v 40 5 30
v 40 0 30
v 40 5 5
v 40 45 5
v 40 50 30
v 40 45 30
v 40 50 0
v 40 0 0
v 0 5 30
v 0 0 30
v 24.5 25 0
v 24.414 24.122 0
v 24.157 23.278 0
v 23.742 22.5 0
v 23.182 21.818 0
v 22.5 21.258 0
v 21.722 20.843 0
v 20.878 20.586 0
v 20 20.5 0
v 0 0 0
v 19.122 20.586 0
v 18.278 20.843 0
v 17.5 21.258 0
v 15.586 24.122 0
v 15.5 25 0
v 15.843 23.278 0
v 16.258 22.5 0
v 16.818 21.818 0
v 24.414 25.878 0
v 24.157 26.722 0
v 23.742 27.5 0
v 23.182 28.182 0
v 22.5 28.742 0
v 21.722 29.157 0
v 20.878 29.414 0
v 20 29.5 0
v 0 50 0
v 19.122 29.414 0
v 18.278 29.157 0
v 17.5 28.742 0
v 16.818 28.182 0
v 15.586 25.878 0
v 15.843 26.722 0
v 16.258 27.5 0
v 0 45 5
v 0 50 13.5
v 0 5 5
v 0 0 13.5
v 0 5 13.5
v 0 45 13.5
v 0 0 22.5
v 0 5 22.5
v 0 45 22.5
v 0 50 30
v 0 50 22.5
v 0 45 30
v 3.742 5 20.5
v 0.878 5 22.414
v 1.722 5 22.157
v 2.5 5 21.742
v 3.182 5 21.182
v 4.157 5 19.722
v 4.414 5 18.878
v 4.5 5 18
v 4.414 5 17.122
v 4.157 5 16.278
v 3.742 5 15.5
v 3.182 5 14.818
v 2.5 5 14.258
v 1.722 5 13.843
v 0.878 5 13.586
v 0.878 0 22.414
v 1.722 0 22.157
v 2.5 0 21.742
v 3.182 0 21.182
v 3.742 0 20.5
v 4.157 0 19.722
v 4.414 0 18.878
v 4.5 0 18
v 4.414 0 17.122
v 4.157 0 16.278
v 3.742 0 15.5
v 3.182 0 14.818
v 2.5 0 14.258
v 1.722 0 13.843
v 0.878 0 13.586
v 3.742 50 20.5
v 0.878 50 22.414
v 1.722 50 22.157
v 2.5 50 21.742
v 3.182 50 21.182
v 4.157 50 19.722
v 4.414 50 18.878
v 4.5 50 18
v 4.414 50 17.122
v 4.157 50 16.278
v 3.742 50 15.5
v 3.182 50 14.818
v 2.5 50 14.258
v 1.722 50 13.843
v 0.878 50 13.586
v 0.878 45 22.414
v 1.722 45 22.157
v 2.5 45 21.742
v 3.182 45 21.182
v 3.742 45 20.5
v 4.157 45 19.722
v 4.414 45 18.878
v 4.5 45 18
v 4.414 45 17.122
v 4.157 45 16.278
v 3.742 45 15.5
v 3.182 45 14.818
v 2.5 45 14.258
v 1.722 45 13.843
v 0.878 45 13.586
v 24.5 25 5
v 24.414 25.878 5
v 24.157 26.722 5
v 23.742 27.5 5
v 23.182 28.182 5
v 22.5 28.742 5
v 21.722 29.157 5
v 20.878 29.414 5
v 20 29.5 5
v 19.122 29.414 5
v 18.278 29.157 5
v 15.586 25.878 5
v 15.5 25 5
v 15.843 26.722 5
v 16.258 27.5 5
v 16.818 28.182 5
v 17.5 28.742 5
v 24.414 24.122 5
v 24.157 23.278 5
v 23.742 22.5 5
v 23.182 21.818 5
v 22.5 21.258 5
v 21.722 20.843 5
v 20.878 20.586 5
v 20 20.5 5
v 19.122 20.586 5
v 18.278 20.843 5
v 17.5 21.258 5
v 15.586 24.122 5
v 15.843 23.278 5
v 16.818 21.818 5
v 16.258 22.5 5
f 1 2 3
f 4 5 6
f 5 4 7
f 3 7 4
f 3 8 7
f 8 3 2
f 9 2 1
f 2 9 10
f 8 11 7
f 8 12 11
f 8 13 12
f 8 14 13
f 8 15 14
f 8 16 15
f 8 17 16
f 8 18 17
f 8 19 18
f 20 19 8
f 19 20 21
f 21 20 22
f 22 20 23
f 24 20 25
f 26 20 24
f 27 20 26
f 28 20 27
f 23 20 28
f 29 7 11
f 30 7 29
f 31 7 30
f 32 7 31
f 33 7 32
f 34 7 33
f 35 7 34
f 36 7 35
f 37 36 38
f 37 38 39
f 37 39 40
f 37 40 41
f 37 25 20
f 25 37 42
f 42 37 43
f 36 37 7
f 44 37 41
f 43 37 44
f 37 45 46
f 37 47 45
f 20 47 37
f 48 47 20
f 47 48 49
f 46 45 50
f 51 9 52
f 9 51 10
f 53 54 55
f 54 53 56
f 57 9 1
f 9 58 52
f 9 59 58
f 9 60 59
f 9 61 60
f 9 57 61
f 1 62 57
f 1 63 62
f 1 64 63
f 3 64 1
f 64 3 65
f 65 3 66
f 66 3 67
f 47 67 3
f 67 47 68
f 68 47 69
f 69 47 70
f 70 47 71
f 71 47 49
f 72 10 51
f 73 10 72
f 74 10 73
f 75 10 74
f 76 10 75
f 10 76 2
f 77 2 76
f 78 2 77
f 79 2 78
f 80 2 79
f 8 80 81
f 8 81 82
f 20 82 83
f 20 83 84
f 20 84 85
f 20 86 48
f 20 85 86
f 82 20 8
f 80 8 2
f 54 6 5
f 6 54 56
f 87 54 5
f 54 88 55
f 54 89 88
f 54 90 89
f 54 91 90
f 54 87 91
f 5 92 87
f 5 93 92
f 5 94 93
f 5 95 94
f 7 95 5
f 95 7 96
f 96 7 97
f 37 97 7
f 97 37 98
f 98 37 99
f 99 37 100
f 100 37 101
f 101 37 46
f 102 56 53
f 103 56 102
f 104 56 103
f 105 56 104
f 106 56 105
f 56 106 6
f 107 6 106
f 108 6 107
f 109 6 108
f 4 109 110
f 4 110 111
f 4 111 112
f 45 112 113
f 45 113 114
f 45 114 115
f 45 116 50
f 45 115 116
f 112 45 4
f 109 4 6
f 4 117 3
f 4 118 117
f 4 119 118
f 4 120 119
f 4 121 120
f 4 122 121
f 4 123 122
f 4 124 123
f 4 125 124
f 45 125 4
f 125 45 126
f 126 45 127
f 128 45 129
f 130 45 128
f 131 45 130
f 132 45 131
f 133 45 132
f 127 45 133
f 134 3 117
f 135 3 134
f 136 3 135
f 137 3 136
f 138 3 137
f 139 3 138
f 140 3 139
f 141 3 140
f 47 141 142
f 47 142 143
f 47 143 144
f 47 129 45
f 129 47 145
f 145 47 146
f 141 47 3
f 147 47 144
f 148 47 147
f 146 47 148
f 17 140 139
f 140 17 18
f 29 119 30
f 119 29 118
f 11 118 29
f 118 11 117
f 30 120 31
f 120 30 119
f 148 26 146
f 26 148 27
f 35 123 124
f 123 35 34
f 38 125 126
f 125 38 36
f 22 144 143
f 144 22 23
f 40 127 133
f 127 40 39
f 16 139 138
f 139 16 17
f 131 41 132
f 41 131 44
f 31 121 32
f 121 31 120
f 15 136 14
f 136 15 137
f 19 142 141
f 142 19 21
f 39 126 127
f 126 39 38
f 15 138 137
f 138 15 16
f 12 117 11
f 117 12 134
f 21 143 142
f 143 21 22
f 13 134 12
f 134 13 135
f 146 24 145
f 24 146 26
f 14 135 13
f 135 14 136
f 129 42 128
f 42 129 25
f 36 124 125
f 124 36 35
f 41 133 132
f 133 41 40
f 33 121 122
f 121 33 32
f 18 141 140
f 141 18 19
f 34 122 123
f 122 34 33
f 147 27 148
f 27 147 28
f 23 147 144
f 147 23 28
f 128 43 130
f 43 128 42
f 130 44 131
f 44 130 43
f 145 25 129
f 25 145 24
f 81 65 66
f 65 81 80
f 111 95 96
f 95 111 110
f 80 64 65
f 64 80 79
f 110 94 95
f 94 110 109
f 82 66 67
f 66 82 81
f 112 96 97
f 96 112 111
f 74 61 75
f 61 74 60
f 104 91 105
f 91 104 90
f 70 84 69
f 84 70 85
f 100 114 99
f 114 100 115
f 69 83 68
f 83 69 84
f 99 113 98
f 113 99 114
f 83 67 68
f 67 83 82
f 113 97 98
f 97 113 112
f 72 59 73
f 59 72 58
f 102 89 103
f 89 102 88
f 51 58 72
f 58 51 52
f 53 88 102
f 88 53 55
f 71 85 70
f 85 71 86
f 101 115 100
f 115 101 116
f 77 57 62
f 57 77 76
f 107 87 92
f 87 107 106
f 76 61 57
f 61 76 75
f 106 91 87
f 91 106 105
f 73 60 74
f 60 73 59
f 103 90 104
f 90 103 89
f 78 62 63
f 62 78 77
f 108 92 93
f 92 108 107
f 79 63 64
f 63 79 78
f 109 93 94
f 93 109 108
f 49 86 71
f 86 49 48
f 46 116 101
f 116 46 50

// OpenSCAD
$fn = 32;

// ----------------------------------------------------------------------
// U-bracket: 40 x 50 x 30 mm
// ----------------------------------------------------------------------

// --- parameters (mm) ---
rail_len = 40;            // outer length, X
jaw_w = 50;               // outer width, Y
jaw_h = 30;               // upright height, Z
web_t = 5;                // wall thickness
hole_d = 9;               // clearance for M8

module hole_z(px, py) {
  translate([px, py, -2.5]) cylinder(h = web_t + 5, d = hole_d);
}
module hole_y_pz(pz) {
  /* through both uprights along Y */
  translate([0, -2.5, pz]) rotate([-90, 0, 0]) cylinder(h = jaw_w + 5, d = hole_d);
}

module base() {
  cube([rail_len, jaw_w, web_t]);
}

module uprights() {
  cube([rail_len, web_t, jaw_h]);
  translate([0, jaw_w - web_t, 0]) cube([rail_len, web_t, jaw_h]);
}

difference() {
  union() {
    base();
    uprights();
  }
  hole_z(20, 25);
  hole_y_pz(18);
}
